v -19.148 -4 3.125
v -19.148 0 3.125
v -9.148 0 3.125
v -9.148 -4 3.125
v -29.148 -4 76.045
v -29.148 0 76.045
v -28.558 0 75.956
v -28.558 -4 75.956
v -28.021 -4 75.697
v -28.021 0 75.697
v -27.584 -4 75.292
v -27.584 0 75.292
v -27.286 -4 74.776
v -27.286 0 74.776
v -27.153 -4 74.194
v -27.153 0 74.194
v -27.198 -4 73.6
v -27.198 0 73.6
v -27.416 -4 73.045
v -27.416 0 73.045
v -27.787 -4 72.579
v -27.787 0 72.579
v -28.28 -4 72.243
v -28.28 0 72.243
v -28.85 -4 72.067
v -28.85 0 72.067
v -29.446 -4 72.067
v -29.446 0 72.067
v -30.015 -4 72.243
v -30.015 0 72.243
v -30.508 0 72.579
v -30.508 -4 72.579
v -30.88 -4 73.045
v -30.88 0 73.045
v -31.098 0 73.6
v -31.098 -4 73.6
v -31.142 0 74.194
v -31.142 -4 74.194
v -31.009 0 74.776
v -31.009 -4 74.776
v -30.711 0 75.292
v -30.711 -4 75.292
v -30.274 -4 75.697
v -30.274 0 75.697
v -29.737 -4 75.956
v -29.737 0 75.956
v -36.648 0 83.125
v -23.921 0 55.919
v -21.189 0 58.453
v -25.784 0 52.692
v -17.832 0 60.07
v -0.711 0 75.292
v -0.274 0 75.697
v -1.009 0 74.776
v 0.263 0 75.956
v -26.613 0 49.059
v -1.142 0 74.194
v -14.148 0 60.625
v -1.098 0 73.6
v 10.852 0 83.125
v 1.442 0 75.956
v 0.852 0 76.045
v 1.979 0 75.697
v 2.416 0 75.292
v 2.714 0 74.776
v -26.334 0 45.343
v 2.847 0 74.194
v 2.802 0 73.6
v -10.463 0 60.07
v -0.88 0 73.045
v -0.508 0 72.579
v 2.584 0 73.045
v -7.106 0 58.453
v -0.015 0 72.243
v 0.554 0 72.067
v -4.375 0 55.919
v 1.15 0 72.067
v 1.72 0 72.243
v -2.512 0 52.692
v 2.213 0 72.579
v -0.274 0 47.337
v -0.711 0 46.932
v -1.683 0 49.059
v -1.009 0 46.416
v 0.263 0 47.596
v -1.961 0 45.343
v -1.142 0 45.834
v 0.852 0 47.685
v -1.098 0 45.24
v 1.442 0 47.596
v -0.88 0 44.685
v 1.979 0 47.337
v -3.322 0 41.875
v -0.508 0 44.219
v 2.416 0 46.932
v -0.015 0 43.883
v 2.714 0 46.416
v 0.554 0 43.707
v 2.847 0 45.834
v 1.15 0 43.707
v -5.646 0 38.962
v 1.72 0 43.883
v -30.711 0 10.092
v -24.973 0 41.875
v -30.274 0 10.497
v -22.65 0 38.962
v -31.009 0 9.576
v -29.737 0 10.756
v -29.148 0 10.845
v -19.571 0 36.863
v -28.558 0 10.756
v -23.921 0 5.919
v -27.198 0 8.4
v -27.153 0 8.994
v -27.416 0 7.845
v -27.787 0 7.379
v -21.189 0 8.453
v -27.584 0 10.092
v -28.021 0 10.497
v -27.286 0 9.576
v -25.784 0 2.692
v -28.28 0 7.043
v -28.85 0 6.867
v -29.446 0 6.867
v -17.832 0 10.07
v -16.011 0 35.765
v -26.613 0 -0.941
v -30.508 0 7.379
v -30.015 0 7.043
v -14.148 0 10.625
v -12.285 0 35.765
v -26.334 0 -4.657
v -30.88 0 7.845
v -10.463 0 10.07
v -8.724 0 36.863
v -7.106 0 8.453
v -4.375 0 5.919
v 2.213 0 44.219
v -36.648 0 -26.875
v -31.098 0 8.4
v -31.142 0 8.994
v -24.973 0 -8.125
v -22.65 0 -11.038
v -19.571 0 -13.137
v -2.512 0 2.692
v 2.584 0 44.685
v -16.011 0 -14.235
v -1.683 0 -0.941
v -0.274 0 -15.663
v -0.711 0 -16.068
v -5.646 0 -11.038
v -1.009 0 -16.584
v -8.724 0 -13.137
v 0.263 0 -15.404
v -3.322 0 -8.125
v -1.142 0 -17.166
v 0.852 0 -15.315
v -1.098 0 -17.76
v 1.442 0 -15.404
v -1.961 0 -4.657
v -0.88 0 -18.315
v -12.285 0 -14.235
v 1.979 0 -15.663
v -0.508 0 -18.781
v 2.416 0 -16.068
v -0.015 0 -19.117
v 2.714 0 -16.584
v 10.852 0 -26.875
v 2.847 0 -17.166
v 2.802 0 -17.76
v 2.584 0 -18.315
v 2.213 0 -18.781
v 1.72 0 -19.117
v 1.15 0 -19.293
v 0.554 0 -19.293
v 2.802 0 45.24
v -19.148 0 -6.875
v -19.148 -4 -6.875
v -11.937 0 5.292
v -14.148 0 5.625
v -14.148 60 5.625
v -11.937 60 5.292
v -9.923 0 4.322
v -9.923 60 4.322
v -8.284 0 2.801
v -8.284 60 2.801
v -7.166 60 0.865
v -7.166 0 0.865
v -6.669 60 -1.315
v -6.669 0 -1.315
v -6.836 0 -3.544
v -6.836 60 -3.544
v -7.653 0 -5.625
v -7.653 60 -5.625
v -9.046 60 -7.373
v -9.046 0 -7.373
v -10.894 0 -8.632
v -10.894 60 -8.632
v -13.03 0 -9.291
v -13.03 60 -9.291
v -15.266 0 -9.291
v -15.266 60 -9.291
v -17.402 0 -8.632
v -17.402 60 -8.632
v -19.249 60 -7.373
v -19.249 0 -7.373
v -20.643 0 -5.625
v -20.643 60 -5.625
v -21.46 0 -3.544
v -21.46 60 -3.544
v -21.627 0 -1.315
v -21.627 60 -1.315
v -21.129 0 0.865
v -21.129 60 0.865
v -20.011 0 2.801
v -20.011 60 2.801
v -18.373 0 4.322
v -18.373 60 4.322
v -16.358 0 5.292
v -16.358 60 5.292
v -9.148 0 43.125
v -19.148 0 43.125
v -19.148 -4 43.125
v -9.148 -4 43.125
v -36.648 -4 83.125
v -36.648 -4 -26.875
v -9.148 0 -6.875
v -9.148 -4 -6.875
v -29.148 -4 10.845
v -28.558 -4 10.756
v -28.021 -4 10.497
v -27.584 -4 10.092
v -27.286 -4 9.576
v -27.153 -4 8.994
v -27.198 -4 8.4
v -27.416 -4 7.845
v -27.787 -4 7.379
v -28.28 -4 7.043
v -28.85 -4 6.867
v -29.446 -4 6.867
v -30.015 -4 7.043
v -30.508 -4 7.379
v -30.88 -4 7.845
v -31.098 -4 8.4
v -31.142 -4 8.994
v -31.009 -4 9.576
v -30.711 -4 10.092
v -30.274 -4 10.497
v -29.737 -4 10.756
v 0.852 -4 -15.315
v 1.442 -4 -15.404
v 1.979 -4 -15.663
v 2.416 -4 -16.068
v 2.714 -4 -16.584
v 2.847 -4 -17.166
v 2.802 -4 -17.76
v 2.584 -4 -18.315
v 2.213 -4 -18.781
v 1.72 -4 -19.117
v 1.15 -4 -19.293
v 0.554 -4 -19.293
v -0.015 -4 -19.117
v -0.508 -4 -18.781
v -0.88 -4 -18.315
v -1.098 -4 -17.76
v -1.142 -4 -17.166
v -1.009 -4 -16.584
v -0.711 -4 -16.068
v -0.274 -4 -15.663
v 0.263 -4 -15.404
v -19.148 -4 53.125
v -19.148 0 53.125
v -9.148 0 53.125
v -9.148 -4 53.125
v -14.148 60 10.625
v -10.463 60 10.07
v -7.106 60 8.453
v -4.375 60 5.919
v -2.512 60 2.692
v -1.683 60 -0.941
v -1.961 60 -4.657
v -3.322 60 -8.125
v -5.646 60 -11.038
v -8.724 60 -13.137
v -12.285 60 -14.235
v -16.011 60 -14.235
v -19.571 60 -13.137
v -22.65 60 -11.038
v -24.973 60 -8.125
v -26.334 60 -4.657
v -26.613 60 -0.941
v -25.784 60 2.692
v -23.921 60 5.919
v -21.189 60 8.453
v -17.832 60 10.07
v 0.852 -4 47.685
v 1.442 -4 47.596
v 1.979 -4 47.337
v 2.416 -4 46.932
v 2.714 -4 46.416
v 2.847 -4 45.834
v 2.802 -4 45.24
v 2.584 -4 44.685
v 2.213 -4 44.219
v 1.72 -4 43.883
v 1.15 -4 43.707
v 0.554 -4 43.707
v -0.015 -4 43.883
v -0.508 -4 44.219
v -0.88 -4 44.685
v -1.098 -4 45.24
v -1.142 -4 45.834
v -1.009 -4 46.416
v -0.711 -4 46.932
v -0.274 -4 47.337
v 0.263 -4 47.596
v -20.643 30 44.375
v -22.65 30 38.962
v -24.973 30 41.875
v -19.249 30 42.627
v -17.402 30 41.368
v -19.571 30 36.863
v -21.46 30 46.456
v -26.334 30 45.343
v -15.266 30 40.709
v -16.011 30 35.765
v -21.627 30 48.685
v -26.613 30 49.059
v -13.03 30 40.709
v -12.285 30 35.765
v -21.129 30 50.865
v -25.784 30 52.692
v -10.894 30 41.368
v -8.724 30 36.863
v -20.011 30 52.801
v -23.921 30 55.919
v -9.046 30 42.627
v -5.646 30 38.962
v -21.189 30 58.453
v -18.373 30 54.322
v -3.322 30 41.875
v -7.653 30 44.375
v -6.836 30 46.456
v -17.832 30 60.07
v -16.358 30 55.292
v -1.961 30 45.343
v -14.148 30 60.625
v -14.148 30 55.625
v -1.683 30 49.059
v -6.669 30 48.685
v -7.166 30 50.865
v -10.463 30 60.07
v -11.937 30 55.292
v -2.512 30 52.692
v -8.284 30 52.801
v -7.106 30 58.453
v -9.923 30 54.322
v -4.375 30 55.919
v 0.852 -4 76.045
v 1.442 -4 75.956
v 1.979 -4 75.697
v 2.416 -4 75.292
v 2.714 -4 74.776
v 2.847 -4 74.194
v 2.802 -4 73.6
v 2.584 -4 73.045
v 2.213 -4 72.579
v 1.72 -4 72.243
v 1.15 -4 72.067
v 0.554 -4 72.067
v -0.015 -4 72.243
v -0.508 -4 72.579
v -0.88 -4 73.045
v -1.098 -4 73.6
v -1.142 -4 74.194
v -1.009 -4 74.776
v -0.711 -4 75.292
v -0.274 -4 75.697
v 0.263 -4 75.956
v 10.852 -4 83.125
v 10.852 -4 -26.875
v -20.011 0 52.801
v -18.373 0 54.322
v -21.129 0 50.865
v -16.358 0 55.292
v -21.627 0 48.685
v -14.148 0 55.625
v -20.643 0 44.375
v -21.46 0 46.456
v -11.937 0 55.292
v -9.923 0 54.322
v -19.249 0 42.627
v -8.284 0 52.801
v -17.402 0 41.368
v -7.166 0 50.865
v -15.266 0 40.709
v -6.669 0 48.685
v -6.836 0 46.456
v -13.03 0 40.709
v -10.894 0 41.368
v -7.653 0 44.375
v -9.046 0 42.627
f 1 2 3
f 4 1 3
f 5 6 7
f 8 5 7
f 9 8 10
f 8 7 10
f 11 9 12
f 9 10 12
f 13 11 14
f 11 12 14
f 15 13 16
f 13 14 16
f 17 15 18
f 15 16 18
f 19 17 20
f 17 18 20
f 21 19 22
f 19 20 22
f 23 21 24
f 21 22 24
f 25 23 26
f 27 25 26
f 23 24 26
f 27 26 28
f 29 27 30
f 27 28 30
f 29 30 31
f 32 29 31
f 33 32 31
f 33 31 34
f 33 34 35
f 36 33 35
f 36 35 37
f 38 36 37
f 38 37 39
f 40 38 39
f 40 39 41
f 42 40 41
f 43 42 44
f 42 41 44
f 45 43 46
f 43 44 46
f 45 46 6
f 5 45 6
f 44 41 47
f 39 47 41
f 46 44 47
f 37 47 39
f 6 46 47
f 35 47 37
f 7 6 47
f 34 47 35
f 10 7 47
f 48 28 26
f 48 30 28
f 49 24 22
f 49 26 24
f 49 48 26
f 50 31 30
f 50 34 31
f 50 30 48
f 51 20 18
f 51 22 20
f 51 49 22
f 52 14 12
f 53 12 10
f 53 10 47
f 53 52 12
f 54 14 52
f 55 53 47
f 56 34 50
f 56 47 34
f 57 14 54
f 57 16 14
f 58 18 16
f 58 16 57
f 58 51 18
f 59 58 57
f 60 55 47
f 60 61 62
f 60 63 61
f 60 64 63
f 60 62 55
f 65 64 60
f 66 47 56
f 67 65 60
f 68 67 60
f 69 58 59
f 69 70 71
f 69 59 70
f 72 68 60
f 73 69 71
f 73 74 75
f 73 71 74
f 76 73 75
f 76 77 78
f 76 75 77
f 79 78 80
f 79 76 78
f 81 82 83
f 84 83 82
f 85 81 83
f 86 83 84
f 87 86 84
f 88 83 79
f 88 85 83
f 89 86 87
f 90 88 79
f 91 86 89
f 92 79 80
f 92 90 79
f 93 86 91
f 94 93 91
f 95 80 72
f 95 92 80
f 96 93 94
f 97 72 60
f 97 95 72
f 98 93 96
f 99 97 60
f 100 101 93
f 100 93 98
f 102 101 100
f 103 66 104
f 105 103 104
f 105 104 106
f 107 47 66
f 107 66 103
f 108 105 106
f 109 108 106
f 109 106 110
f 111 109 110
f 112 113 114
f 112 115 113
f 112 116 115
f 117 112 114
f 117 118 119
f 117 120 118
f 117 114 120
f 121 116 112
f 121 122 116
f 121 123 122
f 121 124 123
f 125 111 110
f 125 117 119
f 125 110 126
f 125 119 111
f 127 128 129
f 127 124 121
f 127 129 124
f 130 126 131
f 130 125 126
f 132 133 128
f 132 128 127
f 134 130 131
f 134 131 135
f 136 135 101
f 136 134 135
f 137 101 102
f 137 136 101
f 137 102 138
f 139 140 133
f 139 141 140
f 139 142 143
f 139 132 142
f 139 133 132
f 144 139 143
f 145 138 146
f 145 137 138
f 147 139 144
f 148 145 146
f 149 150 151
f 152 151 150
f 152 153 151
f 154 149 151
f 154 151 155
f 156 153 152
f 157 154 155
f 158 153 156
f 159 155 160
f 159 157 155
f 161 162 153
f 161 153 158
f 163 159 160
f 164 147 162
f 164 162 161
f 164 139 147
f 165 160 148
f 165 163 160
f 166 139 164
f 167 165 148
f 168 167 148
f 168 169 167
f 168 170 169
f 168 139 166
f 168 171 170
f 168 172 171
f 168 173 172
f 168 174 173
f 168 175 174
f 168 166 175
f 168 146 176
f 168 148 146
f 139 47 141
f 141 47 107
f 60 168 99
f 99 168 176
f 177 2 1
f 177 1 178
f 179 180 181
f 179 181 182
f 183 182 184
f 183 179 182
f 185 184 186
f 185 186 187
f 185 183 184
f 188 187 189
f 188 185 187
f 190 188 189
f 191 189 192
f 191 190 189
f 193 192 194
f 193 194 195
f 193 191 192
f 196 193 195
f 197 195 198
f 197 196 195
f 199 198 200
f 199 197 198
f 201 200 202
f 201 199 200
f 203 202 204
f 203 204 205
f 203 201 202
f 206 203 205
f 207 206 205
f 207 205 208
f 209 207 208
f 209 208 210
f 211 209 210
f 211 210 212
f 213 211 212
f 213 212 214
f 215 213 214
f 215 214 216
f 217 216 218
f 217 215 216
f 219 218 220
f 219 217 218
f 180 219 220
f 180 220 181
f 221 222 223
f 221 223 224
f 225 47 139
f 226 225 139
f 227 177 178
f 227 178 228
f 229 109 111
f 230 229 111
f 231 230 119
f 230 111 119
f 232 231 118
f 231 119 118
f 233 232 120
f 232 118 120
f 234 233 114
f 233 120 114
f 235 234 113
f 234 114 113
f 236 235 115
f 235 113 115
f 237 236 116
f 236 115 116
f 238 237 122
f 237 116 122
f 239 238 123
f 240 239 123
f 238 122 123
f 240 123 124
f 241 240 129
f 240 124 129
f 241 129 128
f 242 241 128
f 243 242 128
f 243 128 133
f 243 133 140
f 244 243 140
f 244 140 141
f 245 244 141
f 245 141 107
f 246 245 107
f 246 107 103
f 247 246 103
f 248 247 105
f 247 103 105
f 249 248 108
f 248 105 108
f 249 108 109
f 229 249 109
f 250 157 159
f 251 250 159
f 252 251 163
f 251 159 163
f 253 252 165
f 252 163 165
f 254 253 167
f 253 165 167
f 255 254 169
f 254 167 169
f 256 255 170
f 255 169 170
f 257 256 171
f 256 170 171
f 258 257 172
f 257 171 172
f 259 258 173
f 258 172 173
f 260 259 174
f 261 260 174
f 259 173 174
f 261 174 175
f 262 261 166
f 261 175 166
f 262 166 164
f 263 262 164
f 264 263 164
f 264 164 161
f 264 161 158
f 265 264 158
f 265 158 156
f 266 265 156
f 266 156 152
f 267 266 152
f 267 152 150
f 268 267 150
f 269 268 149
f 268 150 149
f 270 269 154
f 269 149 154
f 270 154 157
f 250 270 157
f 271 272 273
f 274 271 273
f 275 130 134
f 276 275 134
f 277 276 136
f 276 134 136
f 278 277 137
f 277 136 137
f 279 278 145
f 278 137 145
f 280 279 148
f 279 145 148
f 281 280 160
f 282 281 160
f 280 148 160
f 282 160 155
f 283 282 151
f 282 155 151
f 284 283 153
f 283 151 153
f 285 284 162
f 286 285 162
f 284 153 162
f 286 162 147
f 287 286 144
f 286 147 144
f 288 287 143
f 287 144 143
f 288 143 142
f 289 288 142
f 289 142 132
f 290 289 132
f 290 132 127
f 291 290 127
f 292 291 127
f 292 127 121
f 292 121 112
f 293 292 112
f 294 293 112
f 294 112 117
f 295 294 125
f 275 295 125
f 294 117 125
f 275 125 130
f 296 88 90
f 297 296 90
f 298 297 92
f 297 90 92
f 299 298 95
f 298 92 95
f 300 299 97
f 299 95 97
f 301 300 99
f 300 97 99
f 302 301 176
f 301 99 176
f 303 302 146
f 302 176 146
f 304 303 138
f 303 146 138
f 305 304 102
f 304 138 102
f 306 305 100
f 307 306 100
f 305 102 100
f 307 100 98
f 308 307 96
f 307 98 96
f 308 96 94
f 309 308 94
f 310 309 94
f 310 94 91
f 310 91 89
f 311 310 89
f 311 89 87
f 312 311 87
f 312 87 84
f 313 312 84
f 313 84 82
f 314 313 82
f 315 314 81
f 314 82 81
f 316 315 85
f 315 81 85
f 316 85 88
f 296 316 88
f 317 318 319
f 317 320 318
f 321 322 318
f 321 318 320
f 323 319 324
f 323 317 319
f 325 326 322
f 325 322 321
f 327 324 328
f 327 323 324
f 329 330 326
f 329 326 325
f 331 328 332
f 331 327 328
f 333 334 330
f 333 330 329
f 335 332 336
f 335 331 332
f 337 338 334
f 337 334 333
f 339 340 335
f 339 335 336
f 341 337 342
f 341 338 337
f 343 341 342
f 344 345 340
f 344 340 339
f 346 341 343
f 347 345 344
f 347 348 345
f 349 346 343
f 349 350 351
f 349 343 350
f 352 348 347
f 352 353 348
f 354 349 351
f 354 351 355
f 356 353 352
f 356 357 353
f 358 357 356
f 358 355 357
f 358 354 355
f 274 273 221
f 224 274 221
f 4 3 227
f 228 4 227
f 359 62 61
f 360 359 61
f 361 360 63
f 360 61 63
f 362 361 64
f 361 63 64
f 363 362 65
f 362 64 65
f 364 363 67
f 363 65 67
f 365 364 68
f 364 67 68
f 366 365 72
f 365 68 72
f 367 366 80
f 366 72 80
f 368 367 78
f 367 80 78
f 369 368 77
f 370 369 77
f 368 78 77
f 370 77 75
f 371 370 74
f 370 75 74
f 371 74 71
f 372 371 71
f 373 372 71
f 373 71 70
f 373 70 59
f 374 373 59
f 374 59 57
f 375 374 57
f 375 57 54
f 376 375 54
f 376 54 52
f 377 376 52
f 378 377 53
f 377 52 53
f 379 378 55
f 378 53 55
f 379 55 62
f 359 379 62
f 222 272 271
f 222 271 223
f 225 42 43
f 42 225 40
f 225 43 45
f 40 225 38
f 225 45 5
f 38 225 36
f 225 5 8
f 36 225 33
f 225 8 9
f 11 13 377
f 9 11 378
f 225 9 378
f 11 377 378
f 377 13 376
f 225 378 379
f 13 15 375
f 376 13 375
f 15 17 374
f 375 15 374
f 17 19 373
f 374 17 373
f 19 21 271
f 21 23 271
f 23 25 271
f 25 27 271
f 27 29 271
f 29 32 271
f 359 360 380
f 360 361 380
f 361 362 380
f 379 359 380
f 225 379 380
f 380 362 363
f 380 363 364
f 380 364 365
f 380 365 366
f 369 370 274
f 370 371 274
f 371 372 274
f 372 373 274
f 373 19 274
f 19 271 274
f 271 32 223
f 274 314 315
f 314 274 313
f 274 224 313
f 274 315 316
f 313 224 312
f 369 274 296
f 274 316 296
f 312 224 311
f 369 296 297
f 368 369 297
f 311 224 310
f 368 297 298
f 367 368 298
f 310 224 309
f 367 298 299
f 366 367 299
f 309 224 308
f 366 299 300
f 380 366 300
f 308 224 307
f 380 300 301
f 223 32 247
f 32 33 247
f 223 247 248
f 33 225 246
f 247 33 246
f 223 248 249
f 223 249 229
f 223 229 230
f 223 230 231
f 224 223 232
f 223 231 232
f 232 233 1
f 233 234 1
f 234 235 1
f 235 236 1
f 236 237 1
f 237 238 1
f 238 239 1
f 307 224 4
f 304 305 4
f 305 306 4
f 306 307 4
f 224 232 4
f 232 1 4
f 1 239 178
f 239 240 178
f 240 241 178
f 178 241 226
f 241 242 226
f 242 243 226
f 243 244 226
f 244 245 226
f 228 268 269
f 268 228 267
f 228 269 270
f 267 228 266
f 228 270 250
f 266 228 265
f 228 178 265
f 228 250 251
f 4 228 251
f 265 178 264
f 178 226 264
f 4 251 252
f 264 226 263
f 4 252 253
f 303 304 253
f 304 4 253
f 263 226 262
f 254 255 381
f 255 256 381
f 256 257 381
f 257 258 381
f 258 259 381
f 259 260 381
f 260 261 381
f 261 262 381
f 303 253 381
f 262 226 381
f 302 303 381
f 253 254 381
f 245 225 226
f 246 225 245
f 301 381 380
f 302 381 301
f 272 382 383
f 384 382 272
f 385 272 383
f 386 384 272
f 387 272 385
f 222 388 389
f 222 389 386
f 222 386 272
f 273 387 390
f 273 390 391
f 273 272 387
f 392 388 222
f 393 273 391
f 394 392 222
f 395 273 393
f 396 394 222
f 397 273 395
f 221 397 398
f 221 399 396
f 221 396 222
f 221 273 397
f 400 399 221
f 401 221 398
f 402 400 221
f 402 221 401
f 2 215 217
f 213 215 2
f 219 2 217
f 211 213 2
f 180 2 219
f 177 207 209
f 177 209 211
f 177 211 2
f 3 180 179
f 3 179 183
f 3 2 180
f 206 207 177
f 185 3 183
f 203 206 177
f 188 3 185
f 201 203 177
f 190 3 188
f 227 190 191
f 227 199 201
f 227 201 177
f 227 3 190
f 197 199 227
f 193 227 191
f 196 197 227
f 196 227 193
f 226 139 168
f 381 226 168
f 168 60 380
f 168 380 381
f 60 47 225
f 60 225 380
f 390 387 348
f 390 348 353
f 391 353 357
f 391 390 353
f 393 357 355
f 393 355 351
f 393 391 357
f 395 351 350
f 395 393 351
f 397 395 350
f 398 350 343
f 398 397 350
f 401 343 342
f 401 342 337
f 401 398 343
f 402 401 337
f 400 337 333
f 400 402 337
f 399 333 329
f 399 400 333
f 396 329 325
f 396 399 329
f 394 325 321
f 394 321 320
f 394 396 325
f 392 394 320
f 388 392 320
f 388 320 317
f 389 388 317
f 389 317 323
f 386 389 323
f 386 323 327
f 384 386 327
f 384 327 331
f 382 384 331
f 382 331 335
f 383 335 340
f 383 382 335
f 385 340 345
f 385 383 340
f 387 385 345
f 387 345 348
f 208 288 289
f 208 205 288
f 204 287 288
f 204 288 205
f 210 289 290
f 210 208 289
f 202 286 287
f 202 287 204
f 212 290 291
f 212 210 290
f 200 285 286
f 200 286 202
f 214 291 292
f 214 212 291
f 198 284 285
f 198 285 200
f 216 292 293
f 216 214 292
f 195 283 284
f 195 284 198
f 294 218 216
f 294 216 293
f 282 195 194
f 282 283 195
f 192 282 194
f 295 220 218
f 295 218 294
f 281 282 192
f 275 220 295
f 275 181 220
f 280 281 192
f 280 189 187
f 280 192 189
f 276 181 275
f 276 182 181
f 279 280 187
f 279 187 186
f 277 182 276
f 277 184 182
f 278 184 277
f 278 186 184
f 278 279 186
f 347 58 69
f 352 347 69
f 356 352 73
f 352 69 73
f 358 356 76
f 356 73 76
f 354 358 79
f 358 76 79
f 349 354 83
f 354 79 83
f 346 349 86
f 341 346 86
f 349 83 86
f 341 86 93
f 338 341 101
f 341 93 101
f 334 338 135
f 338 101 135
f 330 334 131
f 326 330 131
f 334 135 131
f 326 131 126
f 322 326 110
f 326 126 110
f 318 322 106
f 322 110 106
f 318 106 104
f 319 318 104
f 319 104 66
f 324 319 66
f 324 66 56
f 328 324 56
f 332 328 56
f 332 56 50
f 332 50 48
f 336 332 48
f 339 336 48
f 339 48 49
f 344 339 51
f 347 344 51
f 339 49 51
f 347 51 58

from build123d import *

# Parameters (mm, degrees)
SKETCH1_W           = 47.5
SKETCH1_H           = 110
SKETCH1_R           = 2
SKETCH1_W_2         = 10
SKETCH1_H_2         = 10
BOSS_EXTRUDE1_DEPTH = 4
SKETCH2_R           = 12.5
SKETCH2_R_2         = 7.5
BOSS_EXTRUDE2_DEPTH = 30
SKETCH4_R           = 12.5
SKETCH4_R_2         = 7.5
BOSS_EXTRUDE3_DEPTH = 60


with BuildPart() as part:
    # Sketch1 → Boss-Extrude1 (new body)
    with BuildSketch(Plane(origin=(0, 0, 0), x_dir=(1, 0, 0), z_dir=(0, 1, 0))):
        with Locations((-12.897727273, -28.125)):
            Rectangle(SKETCH1_W, SKETCH1_H)
        with Locations(Location((0.852272727, 17.315, 0), (0, 0, 270))):
            Circle(SKETCH1_R, mode=Mode.SUBTRACT)
        with Locations(Location((-29.147727273, -8.845, 0), (0, 0, 270))):
            Circle(SKETCH1_R, mode=Mode.SUBTRACT)
        with Locations(Location((0.852272727, -45.685, 0), (0, 0, 270))):
            Circle(SKETCH1_R, mode=Mode.SUBTRACT)
        with Locations(Location((0.852272727, -74.045, 0), (0, 0, 270))):
            Circle(SKETCH1_R, mode=Mode.SUBTRACT)
        with Locations(Location((-29.147727273, -74.045, 0), (0, 0, 270))):
            Circle(SKETCH1_R, mode=Mode.SUBTRACT)
        with Locations((-14.147727273, 1.875)):
            Rectangle(SKETCH1_W_2, SKETCH1_H_2, mode=Mode.SUBTRACT)
        with Locations((-14.147727273, -48.125)):
            Rectangle(SKETCH1_W_2, SKETCH1_H_2, mode=Mode.SUBTRACT)
    extrude(amount=-BOSS_EXTRUDE1_DEPTH)

    # Sketch2 → Boss-Extrude2 (add)
    with BuildSketch(Plane(origin=(0, 0, 0), x_dir=(1, 0, 0), z_dir=(0, 1, 0))):
        with Locations(Location((-14.147727273, -48.125, 0), (0, 0, 270))):
            Circle(SKETCH2_R)
        with Locations(Location((-14.147727273, -48.125, 0), (0, 0, 270))):
            Circle(SKETCH2_R_2, mode=Mode.SUBTRACT)
    extrude(amount=BOSS_EXTRUDE2_DEPTH)

    # Sketch4 → Boss-Extrude3 (add)
    with BuildSketch(Plane(origin=(0, 0, 0), x_dir=(1, 0, 0), z_dir=(0, 1, 0))):
        with Locations(Location((-14.147727273, 1.875, 0), (0, 0, 270))):
            Circle(SKETCH4_R)
        with Locations(Location((-14.147727273, 1.875, 0), (0, 0, 270))):
            Circle(SKETCH4_R_2, mode=Mode.SUBTRACT)
    extrude(amount=BOSS_EXTRUDE3_DEPTH)


solid = part.part
